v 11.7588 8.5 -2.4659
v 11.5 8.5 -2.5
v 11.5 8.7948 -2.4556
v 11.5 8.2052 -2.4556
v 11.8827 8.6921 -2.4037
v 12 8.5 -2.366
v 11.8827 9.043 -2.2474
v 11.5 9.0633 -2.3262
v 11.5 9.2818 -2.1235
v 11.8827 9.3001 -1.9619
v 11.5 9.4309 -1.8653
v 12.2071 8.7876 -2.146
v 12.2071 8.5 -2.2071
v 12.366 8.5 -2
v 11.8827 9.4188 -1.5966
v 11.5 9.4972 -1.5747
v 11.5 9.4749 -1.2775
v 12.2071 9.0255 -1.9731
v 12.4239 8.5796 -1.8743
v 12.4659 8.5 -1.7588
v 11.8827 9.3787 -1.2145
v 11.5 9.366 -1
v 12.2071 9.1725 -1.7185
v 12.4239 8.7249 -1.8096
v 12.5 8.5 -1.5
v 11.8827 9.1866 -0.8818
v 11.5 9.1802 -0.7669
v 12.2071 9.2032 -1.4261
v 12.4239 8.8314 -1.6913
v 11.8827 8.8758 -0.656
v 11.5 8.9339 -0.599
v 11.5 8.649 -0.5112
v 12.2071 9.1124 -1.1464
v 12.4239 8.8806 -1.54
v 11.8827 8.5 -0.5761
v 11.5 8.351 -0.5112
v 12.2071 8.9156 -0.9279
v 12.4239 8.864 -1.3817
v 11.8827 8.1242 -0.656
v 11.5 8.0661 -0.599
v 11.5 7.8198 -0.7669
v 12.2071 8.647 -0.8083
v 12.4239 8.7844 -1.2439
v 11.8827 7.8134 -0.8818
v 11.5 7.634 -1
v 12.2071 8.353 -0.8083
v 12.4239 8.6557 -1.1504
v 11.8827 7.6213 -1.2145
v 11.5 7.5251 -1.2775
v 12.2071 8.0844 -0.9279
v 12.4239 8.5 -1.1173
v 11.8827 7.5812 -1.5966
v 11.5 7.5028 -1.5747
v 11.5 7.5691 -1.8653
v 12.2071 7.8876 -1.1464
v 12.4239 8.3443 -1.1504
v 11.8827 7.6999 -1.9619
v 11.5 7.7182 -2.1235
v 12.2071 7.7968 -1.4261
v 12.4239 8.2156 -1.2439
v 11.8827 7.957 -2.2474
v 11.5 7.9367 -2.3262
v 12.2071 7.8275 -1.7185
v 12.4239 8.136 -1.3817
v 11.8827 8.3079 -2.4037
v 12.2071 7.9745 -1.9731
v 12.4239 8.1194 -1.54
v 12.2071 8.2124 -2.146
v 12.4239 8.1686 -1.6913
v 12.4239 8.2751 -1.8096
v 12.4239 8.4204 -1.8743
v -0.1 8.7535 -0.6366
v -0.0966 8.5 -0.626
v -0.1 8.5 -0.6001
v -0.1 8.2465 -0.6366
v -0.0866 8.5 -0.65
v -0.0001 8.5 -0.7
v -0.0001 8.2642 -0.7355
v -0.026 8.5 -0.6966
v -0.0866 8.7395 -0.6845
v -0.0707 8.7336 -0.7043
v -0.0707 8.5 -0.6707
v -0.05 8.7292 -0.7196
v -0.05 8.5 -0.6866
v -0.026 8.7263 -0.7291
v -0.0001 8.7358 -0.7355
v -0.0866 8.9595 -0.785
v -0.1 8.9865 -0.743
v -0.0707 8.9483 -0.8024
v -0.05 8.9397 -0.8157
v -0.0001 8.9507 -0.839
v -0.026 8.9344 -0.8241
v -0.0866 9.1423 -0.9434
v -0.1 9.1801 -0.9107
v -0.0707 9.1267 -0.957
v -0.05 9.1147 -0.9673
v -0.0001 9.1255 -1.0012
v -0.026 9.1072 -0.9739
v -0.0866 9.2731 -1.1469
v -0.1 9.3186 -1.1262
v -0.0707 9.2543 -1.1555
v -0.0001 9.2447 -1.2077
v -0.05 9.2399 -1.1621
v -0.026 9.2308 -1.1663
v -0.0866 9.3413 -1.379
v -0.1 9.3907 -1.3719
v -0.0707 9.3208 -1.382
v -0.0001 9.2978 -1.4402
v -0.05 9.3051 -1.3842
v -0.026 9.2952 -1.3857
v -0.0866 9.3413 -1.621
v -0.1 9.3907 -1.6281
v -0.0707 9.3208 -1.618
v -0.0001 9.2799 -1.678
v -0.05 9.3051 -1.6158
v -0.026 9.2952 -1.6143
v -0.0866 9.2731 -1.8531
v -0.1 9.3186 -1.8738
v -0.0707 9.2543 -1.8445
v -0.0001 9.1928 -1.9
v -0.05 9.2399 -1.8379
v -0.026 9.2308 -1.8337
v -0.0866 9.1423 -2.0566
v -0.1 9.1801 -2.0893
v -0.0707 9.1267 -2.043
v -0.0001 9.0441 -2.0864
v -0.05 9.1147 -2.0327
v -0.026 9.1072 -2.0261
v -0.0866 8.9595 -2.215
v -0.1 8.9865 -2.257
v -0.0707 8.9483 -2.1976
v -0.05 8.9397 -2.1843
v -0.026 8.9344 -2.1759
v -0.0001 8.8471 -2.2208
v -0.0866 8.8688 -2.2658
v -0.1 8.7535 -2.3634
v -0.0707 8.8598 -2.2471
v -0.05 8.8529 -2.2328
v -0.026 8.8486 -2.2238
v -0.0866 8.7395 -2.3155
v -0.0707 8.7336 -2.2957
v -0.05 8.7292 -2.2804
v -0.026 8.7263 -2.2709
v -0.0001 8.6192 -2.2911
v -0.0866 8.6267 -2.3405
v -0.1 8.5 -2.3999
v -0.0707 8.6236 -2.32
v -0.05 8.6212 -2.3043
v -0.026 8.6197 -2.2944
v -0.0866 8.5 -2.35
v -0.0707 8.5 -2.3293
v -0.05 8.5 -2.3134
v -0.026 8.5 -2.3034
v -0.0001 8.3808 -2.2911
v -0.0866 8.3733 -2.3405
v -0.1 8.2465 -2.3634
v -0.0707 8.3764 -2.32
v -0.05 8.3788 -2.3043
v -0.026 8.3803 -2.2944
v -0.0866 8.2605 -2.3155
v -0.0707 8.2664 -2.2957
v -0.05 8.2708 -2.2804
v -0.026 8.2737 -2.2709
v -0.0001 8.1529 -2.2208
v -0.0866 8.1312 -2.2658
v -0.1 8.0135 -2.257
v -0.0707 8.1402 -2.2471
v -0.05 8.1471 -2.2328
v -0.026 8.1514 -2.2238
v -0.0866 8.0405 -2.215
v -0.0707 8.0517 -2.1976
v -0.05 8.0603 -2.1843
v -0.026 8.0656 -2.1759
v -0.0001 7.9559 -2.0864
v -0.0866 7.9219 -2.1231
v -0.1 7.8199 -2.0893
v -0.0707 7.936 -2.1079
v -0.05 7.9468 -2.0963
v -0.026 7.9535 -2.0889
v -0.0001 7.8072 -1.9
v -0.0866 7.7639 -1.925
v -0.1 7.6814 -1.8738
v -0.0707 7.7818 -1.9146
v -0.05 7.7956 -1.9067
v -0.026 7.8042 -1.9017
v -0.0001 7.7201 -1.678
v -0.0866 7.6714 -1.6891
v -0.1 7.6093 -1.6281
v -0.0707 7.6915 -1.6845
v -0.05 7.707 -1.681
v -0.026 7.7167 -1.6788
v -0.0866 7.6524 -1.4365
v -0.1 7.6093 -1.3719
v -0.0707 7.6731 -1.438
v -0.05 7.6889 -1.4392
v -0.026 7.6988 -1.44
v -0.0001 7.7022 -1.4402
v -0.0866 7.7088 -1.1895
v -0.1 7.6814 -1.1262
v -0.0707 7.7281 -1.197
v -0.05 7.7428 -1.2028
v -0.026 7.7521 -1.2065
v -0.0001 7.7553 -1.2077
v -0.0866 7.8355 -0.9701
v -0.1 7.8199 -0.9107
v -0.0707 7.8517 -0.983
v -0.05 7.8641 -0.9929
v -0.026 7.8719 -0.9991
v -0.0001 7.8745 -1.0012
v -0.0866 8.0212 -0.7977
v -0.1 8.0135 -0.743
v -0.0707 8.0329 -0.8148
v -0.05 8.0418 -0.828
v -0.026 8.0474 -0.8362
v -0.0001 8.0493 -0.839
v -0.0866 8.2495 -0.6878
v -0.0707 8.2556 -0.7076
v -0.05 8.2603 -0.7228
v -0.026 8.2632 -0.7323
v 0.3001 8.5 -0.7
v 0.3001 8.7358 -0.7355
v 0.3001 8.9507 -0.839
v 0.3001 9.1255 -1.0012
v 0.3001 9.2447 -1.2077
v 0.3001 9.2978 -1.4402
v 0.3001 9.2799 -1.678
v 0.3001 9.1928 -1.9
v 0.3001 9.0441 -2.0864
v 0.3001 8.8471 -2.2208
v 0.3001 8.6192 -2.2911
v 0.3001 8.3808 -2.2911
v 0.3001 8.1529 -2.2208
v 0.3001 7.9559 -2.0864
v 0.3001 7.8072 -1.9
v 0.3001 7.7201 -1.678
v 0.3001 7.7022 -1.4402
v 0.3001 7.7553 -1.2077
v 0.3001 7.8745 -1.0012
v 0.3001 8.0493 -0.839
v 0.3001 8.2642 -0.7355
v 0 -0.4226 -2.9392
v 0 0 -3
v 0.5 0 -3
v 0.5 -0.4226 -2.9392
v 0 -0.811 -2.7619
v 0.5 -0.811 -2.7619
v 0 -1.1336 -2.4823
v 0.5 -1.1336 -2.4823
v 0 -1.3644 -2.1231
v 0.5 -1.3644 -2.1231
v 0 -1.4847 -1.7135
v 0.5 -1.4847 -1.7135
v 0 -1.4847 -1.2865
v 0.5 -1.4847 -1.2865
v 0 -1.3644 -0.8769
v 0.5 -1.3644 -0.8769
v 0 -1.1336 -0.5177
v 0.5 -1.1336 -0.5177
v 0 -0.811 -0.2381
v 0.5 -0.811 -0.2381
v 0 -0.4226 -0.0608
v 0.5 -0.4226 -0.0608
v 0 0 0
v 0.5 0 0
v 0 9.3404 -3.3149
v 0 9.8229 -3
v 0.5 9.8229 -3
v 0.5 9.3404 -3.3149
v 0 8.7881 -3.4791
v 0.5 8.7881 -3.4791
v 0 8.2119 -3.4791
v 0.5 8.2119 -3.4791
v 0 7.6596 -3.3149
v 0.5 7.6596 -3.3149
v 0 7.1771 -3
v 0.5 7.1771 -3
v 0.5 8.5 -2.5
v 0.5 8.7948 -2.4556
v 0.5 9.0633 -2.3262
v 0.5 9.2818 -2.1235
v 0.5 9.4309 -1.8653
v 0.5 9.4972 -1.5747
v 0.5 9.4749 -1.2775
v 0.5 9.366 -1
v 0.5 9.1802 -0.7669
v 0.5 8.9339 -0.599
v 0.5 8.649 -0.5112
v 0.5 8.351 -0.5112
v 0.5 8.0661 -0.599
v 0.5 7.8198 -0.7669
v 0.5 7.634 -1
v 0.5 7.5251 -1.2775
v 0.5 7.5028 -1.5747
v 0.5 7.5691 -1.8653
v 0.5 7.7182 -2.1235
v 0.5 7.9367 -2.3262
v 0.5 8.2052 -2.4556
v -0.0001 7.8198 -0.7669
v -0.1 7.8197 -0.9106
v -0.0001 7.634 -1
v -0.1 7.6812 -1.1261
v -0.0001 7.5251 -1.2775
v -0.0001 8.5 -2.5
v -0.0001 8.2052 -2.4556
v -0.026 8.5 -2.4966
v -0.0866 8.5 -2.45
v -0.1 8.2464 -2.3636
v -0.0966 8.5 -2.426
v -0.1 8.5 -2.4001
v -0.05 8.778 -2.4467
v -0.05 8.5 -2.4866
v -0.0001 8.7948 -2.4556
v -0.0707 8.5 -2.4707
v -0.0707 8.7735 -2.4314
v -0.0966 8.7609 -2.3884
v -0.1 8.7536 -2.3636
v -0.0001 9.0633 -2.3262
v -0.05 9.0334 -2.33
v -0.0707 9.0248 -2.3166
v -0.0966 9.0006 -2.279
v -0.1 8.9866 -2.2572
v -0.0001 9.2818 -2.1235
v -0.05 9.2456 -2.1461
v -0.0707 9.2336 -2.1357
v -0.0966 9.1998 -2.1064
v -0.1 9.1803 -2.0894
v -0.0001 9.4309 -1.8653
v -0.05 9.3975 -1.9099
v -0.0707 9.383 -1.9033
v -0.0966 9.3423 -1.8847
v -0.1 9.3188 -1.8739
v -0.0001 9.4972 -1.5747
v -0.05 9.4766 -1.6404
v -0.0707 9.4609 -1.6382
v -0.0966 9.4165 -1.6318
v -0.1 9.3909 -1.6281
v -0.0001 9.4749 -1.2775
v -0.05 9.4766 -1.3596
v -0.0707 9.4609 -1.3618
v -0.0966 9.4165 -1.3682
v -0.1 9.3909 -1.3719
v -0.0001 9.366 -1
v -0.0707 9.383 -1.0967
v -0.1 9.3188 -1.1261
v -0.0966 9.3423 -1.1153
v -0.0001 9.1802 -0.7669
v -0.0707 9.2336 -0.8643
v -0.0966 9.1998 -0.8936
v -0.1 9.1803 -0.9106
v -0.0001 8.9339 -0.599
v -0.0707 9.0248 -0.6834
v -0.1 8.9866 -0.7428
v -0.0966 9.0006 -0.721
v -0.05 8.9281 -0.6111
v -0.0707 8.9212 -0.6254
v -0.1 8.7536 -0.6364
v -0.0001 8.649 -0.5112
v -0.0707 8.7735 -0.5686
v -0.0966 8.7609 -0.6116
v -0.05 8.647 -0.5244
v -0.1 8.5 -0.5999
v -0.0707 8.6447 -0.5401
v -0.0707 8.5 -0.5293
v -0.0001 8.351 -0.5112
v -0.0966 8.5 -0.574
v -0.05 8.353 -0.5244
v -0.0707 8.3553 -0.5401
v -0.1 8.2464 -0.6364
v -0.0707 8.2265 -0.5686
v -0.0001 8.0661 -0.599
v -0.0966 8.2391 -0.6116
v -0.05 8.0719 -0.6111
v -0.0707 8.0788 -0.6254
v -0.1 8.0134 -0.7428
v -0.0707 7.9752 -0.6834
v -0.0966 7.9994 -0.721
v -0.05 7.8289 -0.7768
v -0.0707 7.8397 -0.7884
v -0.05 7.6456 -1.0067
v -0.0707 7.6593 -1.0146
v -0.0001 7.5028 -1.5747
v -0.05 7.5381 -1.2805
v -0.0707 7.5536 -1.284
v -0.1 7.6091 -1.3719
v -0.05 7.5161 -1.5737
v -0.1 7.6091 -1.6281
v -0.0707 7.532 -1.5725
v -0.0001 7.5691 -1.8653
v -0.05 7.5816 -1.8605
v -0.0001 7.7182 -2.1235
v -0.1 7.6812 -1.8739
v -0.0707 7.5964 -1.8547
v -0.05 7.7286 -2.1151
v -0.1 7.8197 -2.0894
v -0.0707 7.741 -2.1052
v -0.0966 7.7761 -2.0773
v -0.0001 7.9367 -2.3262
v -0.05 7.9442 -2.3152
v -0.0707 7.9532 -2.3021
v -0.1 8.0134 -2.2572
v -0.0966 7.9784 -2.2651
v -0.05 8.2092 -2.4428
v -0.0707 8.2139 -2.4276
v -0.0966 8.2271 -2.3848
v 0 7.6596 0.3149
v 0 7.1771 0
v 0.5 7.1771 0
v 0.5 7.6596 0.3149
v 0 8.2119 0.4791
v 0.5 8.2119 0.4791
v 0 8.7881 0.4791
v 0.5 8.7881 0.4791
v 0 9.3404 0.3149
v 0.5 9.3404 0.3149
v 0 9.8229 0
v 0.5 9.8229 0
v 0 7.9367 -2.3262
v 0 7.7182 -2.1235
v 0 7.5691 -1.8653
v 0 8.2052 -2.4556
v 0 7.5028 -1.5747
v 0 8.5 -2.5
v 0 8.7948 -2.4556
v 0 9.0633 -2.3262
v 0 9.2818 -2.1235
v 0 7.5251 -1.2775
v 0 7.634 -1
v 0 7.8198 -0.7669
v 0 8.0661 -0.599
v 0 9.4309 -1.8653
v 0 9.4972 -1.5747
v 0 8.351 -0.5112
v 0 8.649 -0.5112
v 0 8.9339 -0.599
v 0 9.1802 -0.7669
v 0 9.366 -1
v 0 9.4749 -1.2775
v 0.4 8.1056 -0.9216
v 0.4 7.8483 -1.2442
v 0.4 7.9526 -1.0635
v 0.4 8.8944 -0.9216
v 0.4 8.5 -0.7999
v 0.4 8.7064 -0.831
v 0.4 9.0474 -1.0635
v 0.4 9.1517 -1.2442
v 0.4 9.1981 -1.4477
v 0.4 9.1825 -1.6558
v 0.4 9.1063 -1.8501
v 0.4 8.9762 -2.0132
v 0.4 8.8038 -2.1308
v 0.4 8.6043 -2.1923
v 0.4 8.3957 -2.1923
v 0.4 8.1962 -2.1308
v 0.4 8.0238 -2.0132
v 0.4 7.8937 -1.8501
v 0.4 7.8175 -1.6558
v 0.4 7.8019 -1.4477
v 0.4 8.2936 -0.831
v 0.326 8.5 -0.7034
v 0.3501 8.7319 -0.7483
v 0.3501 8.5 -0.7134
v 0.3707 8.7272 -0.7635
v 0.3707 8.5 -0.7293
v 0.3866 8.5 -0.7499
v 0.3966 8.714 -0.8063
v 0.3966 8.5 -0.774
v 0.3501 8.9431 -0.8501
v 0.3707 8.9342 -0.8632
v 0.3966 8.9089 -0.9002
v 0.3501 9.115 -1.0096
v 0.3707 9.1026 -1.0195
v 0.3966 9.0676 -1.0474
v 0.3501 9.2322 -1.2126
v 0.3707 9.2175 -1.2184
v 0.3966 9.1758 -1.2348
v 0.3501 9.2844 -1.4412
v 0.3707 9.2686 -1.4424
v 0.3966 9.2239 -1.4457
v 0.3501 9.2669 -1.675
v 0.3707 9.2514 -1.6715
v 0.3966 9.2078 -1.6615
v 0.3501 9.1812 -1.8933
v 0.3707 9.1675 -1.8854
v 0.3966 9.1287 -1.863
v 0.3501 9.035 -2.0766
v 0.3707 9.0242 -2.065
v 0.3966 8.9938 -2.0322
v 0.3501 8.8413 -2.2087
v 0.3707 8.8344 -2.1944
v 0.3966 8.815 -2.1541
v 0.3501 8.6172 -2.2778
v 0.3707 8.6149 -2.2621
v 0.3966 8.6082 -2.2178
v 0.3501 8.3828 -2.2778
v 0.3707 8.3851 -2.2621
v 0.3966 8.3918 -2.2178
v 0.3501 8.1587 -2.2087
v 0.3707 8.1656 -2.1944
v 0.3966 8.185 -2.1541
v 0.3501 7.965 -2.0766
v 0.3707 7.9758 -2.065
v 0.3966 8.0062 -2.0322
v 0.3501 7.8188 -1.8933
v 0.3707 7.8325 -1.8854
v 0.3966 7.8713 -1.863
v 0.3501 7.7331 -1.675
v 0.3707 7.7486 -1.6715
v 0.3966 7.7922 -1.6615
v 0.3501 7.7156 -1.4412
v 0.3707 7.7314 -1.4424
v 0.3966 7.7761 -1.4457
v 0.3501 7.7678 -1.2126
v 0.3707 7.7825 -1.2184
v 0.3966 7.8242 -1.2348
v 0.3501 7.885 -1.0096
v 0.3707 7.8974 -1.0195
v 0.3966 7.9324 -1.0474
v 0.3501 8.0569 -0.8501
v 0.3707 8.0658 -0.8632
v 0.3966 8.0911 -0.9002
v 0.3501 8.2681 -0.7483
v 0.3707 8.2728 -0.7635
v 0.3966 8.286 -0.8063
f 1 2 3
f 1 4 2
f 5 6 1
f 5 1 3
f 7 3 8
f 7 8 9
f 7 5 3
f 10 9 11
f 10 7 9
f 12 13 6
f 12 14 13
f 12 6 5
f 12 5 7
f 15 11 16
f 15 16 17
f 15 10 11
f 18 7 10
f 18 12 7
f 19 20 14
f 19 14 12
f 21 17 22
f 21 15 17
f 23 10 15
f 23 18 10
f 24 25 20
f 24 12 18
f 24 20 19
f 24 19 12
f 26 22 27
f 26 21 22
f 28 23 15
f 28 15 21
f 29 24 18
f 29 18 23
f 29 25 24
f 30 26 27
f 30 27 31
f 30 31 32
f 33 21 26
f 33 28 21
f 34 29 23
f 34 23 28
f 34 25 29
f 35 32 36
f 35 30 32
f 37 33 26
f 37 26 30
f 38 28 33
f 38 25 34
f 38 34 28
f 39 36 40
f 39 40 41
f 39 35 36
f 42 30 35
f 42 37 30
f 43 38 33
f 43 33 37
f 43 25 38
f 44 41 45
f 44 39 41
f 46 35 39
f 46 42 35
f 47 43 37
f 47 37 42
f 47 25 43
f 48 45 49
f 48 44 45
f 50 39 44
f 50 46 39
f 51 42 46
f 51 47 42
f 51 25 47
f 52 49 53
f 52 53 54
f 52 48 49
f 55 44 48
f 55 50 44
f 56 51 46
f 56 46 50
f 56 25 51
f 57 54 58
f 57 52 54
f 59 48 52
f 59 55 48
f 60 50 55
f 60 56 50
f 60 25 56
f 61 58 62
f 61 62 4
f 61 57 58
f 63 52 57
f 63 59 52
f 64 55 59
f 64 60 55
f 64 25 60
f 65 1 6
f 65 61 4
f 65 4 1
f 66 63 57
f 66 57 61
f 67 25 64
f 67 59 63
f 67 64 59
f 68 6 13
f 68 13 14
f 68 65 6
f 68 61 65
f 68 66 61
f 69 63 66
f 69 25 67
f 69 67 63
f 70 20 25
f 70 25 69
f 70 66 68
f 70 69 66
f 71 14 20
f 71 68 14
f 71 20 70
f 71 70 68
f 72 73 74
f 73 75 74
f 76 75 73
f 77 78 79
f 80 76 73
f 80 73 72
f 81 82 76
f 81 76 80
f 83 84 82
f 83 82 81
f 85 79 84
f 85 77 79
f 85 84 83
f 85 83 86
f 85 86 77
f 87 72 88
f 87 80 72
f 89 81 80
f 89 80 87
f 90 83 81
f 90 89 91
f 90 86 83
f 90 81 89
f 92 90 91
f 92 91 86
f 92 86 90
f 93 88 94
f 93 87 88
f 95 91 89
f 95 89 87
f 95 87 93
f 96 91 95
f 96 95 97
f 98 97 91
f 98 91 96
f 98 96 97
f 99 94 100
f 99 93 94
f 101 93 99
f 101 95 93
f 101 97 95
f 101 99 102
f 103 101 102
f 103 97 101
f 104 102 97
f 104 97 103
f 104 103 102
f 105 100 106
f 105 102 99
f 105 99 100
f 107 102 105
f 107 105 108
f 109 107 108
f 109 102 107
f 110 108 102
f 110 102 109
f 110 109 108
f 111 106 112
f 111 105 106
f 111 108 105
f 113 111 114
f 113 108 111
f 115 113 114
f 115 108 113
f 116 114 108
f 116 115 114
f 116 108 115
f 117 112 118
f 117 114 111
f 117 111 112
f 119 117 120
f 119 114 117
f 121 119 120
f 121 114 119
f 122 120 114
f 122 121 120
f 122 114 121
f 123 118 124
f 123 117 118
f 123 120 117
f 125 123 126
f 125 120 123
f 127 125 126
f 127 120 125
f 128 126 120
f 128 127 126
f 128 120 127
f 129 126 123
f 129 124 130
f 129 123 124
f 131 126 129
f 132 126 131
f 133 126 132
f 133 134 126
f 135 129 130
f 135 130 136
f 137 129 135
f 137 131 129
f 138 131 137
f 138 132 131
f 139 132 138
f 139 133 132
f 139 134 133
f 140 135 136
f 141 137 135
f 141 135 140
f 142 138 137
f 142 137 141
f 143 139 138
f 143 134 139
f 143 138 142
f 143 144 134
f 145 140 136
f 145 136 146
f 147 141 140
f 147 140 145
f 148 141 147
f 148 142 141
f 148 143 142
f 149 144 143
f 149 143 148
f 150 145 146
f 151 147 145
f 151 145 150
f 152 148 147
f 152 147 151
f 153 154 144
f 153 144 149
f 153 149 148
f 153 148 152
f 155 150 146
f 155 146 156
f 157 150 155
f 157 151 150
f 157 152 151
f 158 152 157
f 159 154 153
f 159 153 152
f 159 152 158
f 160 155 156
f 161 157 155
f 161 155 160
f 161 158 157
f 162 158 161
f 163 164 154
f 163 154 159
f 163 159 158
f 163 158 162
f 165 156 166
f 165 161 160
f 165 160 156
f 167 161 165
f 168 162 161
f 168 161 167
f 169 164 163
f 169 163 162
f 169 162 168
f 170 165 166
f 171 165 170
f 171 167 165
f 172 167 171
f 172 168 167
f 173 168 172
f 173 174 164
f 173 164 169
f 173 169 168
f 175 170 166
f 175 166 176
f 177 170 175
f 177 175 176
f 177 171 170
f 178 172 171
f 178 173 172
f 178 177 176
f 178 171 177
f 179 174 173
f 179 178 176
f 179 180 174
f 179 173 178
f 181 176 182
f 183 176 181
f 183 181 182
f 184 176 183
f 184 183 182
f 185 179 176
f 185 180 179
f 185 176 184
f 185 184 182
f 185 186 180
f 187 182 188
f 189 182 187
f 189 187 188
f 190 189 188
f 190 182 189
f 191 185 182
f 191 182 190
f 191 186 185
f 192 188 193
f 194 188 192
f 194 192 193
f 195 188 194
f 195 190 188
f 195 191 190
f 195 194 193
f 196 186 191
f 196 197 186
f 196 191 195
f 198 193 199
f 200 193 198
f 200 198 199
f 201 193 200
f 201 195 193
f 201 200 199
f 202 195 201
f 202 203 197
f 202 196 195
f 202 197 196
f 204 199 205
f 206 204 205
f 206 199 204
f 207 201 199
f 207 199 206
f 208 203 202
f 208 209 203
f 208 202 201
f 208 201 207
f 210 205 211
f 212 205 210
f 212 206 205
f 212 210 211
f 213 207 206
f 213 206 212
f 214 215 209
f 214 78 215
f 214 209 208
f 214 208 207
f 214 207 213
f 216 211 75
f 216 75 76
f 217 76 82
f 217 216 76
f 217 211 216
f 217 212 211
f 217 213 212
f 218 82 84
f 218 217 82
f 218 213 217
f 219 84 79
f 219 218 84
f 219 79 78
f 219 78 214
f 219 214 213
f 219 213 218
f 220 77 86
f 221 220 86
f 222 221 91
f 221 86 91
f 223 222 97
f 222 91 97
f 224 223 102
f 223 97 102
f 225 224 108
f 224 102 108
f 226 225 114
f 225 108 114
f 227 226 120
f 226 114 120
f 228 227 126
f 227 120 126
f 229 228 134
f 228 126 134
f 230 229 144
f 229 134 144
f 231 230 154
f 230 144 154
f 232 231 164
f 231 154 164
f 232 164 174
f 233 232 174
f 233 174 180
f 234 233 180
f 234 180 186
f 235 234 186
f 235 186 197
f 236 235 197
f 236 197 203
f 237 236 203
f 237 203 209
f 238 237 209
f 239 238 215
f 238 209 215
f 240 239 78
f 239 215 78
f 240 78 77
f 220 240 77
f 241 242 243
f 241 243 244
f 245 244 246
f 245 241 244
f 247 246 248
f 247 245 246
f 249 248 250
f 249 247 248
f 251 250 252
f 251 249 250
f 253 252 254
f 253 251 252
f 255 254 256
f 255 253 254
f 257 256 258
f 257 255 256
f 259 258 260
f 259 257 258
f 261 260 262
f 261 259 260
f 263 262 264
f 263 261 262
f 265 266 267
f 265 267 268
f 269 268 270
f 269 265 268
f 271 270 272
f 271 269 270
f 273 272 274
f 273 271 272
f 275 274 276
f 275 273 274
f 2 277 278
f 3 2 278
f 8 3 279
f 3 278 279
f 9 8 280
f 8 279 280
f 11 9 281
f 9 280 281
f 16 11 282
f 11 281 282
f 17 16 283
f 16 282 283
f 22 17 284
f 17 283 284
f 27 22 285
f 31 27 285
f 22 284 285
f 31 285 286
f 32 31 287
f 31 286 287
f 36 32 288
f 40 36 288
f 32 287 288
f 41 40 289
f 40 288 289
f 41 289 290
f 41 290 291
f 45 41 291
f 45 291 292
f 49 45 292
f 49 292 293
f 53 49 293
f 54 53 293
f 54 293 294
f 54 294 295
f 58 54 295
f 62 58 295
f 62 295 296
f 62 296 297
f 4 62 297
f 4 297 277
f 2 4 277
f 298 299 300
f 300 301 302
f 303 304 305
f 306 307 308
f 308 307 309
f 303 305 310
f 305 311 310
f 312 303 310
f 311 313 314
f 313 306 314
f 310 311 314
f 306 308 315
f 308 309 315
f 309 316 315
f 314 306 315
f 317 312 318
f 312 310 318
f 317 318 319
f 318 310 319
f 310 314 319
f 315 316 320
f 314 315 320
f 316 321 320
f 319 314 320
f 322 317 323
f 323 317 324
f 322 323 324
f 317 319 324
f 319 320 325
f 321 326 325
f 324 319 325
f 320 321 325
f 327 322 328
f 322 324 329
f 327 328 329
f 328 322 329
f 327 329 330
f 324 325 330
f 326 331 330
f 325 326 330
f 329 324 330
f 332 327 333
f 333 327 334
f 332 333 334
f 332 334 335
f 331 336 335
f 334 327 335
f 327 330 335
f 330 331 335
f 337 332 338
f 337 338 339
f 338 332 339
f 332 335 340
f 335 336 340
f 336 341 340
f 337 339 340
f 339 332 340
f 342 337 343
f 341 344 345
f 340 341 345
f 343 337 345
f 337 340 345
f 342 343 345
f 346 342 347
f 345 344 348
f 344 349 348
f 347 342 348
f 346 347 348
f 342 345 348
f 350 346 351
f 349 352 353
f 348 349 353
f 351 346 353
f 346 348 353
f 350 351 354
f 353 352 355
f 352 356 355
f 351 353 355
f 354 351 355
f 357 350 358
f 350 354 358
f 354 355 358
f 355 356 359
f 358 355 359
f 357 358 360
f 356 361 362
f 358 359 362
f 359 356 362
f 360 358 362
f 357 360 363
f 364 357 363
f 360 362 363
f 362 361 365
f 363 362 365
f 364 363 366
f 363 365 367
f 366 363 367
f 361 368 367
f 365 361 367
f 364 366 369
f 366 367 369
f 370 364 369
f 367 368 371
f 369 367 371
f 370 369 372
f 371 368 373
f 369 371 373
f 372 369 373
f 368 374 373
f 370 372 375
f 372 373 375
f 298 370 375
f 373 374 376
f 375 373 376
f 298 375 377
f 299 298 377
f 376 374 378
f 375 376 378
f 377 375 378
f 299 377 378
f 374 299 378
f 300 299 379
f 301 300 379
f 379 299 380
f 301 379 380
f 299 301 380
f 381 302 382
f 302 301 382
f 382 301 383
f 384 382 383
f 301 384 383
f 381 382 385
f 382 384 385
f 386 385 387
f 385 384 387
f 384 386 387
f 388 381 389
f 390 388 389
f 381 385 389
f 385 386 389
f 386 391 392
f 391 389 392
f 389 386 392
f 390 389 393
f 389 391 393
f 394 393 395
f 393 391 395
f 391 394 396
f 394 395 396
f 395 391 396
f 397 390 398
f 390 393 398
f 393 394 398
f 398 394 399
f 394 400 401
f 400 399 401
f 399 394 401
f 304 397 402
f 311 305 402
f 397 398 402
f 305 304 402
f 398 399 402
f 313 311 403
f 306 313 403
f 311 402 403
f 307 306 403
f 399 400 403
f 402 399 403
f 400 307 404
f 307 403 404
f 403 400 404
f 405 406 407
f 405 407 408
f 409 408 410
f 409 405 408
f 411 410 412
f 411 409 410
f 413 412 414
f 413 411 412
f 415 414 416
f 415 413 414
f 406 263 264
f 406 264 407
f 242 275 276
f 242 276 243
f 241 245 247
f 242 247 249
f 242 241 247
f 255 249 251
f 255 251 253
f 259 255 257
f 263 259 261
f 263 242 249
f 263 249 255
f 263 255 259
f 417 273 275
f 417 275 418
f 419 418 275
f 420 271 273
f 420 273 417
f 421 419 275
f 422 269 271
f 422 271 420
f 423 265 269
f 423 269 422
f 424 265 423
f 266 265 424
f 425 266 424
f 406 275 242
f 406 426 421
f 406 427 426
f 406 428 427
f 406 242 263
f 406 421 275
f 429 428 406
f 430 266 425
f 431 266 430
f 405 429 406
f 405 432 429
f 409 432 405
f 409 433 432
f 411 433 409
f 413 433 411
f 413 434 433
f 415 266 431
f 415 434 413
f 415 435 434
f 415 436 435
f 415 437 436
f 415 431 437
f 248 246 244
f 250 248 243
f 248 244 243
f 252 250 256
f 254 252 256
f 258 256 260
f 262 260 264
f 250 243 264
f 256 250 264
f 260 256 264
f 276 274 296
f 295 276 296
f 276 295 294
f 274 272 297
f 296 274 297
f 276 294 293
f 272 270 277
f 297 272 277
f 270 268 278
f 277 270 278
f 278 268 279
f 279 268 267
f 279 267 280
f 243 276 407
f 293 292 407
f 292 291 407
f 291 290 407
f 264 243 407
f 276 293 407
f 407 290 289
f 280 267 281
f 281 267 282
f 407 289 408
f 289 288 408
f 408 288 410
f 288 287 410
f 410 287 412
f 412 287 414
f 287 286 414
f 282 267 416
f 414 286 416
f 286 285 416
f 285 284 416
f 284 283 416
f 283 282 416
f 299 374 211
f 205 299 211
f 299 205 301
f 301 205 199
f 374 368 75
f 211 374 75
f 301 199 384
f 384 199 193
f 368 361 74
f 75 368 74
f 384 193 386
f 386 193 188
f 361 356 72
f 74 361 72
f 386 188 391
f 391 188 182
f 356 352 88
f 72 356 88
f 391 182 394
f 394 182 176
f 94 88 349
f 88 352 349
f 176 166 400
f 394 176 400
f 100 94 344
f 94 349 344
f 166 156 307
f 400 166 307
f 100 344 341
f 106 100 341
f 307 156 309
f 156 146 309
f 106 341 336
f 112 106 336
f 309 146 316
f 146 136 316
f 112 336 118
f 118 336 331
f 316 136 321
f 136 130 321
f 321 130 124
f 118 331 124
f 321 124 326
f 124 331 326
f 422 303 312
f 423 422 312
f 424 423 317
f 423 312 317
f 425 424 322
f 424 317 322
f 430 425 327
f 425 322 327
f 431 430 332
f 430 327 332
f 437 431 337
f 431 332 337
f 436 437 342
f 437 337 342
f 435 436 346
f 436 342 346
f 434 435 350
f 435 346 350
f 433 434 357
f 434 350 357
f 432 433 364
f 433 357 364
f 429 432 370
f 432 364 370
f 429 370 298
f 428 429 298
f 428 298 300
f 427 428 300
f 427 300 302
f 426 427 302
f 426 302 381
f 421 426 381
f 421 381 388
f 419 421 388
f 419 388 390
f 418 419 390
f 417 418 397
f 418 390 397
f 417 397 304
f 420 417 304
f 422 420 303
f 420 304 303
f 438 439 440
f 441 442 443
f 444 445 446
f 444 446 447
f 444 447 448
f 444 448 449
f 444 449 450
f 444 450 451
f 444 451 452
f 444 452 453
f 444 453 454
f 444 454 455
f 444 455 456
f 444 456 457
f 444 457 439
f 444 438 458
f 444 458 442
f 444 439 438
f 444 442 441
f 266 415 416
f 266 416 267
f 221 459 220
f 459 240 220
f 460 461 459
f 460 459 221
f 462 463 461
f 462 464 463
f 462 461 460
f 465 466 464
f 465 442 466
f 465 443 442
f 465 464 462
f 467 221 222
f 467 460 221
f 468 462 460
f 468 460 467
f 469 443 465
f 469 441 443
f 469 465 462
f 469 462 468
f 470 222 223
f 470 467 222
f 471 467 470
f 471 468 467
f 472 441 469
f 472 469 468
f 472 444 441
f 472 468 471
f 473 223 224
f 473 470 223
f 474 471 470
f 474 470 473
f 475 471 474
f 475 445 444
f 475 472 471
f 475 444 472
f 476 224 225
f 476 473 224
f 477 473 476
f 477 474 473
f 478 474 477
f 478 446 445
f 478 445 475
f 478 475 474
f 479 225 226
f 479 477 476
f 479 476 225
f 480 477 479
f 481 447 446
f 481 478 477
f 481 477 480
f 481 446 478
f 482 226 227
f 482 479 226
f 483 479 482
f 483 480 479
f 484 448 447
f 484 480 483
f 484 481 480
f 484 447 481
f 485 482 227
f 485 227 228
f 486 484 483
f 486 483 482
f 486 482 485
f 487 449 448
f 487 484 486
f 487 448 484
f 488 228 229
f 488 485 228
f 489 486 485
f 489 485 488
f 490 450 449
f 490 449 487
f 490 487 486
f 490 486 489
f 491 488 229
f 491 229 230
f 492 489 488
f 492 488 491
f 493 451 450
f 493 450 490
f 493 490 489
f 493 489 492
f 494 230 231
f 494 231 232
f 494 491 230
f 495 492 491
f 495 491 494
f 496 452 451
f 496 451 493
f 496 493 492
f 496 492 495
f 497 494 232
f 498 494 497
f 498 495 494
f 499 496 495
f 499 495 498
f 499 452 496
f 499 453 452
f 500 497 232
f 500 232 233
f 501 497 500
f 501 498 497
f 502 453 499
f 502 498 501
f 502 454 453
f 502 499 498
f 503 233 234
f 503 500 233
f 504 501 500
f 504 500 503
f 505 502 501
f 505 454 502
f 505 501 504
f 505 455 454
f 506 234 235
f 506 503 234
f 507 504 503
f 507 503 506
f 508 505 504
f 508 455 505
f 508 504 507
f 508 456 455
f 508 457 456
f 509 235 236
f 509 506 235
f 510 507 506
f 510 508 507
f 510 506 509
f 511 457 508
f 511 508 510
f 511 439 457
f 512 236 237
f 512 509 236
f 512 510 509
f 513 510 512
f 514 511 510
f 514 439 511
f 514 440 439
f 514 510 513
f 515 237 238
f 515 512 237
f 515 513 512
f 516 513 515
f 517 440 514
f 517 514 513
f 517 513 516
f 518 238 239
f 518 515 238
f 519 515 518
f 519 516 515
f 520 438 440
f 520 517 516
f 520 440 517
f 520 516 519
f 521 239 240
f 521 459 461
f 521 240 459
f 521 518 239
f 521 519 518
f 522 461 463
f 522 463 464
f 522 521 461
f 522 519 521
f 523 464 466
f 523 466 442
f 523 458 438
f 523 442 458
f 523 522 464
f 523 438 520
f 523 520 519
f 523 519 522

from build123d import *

# Parameters (mm, degrees)
BOSS_EXTRUDE1_DEPTH      = 0.5
BOSS_EXTRUDE2_DEPTH      = 12
BOSS_EXTRUDE2_DEPTH_BACK = 0.6
SKETCH2_R                = 1
FILLET1_R                = 1
SKETCH3_R                = 0.8
CUT_EXTRUDE1_DEPTH       = 0.5
FILLET2_R                = 0.1


with BuildPart() as part:
    # Sketch1 → Boss-Extrude1 (new body)
    with BuildSketch(Plane(origin=(0, 0, 0), x_dir=(0, 0, -1), z_dir=(1, 0, 0))):
        with BuildLine():
            Line((0, 0), (0, 7.177124344))
            ThreePointArc((0, 7.177124344), (-0.5, 8.5), (0, 9.822875656))
            Line((0, 9.822875656), (3, 9.822875656))
            ThreePointArc((3, 9.822875656), (3.5, 8.5), (3, 7.177124344))
            Line((3, 7.177124344), (3, 0))
            ThreePointArc((3, 0), (1.5, -1.5), (0, 0))
        make_face()
    extrude(amount=BOSS_EXTRUDE1_DEPTH)

    # Sketch2 → Boss-Extrude2 (add, two sides: drawn at the far end of the back side and taken through both)
    with BuildSketch(Plane(origin=(0.5, 0, 0), x_dir=(0, 0, -1), z_dir=(1, 0, 0)).offset(-BOSS_EXTRUDE2_DEPTH_BACK)):
        with Locations((1.5, 8.5)):
            Circle(SKETCH2_R)
    extrude(amount=BOSS_EXTRUDE2_DEPTH + BOSS_EXTRUDE2_DEPTH_BACK)

    # Fillet1
    fillet1_edges = [part.edges().sort_by_distance(p)[0] for p in [
        (12.5, 8.5, -0.5),
    ]]
    fillet(fillet1_edges, radius=FILLET1_R)

    # Sketch3 → Cut-Extrude1 (cut)
    with BuildSketch(Plane.ZY.offset(0.1)):
        with Locations((-1.5, 8.5)):
            Circle(SKETCH3_R)
    extrude(amount=-CUT_EXTRUDE1_DEPTH, mode=Mode.SUBTRACT)

    # Fillet2
    fillet2_edges = [part.edges().sort_by_distance(p)[0] for p in [
        (-0.1, 8.5, -0.5),
        (0.4, 8.5, -2.3),
        (-0.1, 8.5, -2.3),
    ]]
    fillet(fillet2_edges, radius=FILLET2_R - 0.0001)  # a hair under: the kernel refuses the full size


solid = part.part
